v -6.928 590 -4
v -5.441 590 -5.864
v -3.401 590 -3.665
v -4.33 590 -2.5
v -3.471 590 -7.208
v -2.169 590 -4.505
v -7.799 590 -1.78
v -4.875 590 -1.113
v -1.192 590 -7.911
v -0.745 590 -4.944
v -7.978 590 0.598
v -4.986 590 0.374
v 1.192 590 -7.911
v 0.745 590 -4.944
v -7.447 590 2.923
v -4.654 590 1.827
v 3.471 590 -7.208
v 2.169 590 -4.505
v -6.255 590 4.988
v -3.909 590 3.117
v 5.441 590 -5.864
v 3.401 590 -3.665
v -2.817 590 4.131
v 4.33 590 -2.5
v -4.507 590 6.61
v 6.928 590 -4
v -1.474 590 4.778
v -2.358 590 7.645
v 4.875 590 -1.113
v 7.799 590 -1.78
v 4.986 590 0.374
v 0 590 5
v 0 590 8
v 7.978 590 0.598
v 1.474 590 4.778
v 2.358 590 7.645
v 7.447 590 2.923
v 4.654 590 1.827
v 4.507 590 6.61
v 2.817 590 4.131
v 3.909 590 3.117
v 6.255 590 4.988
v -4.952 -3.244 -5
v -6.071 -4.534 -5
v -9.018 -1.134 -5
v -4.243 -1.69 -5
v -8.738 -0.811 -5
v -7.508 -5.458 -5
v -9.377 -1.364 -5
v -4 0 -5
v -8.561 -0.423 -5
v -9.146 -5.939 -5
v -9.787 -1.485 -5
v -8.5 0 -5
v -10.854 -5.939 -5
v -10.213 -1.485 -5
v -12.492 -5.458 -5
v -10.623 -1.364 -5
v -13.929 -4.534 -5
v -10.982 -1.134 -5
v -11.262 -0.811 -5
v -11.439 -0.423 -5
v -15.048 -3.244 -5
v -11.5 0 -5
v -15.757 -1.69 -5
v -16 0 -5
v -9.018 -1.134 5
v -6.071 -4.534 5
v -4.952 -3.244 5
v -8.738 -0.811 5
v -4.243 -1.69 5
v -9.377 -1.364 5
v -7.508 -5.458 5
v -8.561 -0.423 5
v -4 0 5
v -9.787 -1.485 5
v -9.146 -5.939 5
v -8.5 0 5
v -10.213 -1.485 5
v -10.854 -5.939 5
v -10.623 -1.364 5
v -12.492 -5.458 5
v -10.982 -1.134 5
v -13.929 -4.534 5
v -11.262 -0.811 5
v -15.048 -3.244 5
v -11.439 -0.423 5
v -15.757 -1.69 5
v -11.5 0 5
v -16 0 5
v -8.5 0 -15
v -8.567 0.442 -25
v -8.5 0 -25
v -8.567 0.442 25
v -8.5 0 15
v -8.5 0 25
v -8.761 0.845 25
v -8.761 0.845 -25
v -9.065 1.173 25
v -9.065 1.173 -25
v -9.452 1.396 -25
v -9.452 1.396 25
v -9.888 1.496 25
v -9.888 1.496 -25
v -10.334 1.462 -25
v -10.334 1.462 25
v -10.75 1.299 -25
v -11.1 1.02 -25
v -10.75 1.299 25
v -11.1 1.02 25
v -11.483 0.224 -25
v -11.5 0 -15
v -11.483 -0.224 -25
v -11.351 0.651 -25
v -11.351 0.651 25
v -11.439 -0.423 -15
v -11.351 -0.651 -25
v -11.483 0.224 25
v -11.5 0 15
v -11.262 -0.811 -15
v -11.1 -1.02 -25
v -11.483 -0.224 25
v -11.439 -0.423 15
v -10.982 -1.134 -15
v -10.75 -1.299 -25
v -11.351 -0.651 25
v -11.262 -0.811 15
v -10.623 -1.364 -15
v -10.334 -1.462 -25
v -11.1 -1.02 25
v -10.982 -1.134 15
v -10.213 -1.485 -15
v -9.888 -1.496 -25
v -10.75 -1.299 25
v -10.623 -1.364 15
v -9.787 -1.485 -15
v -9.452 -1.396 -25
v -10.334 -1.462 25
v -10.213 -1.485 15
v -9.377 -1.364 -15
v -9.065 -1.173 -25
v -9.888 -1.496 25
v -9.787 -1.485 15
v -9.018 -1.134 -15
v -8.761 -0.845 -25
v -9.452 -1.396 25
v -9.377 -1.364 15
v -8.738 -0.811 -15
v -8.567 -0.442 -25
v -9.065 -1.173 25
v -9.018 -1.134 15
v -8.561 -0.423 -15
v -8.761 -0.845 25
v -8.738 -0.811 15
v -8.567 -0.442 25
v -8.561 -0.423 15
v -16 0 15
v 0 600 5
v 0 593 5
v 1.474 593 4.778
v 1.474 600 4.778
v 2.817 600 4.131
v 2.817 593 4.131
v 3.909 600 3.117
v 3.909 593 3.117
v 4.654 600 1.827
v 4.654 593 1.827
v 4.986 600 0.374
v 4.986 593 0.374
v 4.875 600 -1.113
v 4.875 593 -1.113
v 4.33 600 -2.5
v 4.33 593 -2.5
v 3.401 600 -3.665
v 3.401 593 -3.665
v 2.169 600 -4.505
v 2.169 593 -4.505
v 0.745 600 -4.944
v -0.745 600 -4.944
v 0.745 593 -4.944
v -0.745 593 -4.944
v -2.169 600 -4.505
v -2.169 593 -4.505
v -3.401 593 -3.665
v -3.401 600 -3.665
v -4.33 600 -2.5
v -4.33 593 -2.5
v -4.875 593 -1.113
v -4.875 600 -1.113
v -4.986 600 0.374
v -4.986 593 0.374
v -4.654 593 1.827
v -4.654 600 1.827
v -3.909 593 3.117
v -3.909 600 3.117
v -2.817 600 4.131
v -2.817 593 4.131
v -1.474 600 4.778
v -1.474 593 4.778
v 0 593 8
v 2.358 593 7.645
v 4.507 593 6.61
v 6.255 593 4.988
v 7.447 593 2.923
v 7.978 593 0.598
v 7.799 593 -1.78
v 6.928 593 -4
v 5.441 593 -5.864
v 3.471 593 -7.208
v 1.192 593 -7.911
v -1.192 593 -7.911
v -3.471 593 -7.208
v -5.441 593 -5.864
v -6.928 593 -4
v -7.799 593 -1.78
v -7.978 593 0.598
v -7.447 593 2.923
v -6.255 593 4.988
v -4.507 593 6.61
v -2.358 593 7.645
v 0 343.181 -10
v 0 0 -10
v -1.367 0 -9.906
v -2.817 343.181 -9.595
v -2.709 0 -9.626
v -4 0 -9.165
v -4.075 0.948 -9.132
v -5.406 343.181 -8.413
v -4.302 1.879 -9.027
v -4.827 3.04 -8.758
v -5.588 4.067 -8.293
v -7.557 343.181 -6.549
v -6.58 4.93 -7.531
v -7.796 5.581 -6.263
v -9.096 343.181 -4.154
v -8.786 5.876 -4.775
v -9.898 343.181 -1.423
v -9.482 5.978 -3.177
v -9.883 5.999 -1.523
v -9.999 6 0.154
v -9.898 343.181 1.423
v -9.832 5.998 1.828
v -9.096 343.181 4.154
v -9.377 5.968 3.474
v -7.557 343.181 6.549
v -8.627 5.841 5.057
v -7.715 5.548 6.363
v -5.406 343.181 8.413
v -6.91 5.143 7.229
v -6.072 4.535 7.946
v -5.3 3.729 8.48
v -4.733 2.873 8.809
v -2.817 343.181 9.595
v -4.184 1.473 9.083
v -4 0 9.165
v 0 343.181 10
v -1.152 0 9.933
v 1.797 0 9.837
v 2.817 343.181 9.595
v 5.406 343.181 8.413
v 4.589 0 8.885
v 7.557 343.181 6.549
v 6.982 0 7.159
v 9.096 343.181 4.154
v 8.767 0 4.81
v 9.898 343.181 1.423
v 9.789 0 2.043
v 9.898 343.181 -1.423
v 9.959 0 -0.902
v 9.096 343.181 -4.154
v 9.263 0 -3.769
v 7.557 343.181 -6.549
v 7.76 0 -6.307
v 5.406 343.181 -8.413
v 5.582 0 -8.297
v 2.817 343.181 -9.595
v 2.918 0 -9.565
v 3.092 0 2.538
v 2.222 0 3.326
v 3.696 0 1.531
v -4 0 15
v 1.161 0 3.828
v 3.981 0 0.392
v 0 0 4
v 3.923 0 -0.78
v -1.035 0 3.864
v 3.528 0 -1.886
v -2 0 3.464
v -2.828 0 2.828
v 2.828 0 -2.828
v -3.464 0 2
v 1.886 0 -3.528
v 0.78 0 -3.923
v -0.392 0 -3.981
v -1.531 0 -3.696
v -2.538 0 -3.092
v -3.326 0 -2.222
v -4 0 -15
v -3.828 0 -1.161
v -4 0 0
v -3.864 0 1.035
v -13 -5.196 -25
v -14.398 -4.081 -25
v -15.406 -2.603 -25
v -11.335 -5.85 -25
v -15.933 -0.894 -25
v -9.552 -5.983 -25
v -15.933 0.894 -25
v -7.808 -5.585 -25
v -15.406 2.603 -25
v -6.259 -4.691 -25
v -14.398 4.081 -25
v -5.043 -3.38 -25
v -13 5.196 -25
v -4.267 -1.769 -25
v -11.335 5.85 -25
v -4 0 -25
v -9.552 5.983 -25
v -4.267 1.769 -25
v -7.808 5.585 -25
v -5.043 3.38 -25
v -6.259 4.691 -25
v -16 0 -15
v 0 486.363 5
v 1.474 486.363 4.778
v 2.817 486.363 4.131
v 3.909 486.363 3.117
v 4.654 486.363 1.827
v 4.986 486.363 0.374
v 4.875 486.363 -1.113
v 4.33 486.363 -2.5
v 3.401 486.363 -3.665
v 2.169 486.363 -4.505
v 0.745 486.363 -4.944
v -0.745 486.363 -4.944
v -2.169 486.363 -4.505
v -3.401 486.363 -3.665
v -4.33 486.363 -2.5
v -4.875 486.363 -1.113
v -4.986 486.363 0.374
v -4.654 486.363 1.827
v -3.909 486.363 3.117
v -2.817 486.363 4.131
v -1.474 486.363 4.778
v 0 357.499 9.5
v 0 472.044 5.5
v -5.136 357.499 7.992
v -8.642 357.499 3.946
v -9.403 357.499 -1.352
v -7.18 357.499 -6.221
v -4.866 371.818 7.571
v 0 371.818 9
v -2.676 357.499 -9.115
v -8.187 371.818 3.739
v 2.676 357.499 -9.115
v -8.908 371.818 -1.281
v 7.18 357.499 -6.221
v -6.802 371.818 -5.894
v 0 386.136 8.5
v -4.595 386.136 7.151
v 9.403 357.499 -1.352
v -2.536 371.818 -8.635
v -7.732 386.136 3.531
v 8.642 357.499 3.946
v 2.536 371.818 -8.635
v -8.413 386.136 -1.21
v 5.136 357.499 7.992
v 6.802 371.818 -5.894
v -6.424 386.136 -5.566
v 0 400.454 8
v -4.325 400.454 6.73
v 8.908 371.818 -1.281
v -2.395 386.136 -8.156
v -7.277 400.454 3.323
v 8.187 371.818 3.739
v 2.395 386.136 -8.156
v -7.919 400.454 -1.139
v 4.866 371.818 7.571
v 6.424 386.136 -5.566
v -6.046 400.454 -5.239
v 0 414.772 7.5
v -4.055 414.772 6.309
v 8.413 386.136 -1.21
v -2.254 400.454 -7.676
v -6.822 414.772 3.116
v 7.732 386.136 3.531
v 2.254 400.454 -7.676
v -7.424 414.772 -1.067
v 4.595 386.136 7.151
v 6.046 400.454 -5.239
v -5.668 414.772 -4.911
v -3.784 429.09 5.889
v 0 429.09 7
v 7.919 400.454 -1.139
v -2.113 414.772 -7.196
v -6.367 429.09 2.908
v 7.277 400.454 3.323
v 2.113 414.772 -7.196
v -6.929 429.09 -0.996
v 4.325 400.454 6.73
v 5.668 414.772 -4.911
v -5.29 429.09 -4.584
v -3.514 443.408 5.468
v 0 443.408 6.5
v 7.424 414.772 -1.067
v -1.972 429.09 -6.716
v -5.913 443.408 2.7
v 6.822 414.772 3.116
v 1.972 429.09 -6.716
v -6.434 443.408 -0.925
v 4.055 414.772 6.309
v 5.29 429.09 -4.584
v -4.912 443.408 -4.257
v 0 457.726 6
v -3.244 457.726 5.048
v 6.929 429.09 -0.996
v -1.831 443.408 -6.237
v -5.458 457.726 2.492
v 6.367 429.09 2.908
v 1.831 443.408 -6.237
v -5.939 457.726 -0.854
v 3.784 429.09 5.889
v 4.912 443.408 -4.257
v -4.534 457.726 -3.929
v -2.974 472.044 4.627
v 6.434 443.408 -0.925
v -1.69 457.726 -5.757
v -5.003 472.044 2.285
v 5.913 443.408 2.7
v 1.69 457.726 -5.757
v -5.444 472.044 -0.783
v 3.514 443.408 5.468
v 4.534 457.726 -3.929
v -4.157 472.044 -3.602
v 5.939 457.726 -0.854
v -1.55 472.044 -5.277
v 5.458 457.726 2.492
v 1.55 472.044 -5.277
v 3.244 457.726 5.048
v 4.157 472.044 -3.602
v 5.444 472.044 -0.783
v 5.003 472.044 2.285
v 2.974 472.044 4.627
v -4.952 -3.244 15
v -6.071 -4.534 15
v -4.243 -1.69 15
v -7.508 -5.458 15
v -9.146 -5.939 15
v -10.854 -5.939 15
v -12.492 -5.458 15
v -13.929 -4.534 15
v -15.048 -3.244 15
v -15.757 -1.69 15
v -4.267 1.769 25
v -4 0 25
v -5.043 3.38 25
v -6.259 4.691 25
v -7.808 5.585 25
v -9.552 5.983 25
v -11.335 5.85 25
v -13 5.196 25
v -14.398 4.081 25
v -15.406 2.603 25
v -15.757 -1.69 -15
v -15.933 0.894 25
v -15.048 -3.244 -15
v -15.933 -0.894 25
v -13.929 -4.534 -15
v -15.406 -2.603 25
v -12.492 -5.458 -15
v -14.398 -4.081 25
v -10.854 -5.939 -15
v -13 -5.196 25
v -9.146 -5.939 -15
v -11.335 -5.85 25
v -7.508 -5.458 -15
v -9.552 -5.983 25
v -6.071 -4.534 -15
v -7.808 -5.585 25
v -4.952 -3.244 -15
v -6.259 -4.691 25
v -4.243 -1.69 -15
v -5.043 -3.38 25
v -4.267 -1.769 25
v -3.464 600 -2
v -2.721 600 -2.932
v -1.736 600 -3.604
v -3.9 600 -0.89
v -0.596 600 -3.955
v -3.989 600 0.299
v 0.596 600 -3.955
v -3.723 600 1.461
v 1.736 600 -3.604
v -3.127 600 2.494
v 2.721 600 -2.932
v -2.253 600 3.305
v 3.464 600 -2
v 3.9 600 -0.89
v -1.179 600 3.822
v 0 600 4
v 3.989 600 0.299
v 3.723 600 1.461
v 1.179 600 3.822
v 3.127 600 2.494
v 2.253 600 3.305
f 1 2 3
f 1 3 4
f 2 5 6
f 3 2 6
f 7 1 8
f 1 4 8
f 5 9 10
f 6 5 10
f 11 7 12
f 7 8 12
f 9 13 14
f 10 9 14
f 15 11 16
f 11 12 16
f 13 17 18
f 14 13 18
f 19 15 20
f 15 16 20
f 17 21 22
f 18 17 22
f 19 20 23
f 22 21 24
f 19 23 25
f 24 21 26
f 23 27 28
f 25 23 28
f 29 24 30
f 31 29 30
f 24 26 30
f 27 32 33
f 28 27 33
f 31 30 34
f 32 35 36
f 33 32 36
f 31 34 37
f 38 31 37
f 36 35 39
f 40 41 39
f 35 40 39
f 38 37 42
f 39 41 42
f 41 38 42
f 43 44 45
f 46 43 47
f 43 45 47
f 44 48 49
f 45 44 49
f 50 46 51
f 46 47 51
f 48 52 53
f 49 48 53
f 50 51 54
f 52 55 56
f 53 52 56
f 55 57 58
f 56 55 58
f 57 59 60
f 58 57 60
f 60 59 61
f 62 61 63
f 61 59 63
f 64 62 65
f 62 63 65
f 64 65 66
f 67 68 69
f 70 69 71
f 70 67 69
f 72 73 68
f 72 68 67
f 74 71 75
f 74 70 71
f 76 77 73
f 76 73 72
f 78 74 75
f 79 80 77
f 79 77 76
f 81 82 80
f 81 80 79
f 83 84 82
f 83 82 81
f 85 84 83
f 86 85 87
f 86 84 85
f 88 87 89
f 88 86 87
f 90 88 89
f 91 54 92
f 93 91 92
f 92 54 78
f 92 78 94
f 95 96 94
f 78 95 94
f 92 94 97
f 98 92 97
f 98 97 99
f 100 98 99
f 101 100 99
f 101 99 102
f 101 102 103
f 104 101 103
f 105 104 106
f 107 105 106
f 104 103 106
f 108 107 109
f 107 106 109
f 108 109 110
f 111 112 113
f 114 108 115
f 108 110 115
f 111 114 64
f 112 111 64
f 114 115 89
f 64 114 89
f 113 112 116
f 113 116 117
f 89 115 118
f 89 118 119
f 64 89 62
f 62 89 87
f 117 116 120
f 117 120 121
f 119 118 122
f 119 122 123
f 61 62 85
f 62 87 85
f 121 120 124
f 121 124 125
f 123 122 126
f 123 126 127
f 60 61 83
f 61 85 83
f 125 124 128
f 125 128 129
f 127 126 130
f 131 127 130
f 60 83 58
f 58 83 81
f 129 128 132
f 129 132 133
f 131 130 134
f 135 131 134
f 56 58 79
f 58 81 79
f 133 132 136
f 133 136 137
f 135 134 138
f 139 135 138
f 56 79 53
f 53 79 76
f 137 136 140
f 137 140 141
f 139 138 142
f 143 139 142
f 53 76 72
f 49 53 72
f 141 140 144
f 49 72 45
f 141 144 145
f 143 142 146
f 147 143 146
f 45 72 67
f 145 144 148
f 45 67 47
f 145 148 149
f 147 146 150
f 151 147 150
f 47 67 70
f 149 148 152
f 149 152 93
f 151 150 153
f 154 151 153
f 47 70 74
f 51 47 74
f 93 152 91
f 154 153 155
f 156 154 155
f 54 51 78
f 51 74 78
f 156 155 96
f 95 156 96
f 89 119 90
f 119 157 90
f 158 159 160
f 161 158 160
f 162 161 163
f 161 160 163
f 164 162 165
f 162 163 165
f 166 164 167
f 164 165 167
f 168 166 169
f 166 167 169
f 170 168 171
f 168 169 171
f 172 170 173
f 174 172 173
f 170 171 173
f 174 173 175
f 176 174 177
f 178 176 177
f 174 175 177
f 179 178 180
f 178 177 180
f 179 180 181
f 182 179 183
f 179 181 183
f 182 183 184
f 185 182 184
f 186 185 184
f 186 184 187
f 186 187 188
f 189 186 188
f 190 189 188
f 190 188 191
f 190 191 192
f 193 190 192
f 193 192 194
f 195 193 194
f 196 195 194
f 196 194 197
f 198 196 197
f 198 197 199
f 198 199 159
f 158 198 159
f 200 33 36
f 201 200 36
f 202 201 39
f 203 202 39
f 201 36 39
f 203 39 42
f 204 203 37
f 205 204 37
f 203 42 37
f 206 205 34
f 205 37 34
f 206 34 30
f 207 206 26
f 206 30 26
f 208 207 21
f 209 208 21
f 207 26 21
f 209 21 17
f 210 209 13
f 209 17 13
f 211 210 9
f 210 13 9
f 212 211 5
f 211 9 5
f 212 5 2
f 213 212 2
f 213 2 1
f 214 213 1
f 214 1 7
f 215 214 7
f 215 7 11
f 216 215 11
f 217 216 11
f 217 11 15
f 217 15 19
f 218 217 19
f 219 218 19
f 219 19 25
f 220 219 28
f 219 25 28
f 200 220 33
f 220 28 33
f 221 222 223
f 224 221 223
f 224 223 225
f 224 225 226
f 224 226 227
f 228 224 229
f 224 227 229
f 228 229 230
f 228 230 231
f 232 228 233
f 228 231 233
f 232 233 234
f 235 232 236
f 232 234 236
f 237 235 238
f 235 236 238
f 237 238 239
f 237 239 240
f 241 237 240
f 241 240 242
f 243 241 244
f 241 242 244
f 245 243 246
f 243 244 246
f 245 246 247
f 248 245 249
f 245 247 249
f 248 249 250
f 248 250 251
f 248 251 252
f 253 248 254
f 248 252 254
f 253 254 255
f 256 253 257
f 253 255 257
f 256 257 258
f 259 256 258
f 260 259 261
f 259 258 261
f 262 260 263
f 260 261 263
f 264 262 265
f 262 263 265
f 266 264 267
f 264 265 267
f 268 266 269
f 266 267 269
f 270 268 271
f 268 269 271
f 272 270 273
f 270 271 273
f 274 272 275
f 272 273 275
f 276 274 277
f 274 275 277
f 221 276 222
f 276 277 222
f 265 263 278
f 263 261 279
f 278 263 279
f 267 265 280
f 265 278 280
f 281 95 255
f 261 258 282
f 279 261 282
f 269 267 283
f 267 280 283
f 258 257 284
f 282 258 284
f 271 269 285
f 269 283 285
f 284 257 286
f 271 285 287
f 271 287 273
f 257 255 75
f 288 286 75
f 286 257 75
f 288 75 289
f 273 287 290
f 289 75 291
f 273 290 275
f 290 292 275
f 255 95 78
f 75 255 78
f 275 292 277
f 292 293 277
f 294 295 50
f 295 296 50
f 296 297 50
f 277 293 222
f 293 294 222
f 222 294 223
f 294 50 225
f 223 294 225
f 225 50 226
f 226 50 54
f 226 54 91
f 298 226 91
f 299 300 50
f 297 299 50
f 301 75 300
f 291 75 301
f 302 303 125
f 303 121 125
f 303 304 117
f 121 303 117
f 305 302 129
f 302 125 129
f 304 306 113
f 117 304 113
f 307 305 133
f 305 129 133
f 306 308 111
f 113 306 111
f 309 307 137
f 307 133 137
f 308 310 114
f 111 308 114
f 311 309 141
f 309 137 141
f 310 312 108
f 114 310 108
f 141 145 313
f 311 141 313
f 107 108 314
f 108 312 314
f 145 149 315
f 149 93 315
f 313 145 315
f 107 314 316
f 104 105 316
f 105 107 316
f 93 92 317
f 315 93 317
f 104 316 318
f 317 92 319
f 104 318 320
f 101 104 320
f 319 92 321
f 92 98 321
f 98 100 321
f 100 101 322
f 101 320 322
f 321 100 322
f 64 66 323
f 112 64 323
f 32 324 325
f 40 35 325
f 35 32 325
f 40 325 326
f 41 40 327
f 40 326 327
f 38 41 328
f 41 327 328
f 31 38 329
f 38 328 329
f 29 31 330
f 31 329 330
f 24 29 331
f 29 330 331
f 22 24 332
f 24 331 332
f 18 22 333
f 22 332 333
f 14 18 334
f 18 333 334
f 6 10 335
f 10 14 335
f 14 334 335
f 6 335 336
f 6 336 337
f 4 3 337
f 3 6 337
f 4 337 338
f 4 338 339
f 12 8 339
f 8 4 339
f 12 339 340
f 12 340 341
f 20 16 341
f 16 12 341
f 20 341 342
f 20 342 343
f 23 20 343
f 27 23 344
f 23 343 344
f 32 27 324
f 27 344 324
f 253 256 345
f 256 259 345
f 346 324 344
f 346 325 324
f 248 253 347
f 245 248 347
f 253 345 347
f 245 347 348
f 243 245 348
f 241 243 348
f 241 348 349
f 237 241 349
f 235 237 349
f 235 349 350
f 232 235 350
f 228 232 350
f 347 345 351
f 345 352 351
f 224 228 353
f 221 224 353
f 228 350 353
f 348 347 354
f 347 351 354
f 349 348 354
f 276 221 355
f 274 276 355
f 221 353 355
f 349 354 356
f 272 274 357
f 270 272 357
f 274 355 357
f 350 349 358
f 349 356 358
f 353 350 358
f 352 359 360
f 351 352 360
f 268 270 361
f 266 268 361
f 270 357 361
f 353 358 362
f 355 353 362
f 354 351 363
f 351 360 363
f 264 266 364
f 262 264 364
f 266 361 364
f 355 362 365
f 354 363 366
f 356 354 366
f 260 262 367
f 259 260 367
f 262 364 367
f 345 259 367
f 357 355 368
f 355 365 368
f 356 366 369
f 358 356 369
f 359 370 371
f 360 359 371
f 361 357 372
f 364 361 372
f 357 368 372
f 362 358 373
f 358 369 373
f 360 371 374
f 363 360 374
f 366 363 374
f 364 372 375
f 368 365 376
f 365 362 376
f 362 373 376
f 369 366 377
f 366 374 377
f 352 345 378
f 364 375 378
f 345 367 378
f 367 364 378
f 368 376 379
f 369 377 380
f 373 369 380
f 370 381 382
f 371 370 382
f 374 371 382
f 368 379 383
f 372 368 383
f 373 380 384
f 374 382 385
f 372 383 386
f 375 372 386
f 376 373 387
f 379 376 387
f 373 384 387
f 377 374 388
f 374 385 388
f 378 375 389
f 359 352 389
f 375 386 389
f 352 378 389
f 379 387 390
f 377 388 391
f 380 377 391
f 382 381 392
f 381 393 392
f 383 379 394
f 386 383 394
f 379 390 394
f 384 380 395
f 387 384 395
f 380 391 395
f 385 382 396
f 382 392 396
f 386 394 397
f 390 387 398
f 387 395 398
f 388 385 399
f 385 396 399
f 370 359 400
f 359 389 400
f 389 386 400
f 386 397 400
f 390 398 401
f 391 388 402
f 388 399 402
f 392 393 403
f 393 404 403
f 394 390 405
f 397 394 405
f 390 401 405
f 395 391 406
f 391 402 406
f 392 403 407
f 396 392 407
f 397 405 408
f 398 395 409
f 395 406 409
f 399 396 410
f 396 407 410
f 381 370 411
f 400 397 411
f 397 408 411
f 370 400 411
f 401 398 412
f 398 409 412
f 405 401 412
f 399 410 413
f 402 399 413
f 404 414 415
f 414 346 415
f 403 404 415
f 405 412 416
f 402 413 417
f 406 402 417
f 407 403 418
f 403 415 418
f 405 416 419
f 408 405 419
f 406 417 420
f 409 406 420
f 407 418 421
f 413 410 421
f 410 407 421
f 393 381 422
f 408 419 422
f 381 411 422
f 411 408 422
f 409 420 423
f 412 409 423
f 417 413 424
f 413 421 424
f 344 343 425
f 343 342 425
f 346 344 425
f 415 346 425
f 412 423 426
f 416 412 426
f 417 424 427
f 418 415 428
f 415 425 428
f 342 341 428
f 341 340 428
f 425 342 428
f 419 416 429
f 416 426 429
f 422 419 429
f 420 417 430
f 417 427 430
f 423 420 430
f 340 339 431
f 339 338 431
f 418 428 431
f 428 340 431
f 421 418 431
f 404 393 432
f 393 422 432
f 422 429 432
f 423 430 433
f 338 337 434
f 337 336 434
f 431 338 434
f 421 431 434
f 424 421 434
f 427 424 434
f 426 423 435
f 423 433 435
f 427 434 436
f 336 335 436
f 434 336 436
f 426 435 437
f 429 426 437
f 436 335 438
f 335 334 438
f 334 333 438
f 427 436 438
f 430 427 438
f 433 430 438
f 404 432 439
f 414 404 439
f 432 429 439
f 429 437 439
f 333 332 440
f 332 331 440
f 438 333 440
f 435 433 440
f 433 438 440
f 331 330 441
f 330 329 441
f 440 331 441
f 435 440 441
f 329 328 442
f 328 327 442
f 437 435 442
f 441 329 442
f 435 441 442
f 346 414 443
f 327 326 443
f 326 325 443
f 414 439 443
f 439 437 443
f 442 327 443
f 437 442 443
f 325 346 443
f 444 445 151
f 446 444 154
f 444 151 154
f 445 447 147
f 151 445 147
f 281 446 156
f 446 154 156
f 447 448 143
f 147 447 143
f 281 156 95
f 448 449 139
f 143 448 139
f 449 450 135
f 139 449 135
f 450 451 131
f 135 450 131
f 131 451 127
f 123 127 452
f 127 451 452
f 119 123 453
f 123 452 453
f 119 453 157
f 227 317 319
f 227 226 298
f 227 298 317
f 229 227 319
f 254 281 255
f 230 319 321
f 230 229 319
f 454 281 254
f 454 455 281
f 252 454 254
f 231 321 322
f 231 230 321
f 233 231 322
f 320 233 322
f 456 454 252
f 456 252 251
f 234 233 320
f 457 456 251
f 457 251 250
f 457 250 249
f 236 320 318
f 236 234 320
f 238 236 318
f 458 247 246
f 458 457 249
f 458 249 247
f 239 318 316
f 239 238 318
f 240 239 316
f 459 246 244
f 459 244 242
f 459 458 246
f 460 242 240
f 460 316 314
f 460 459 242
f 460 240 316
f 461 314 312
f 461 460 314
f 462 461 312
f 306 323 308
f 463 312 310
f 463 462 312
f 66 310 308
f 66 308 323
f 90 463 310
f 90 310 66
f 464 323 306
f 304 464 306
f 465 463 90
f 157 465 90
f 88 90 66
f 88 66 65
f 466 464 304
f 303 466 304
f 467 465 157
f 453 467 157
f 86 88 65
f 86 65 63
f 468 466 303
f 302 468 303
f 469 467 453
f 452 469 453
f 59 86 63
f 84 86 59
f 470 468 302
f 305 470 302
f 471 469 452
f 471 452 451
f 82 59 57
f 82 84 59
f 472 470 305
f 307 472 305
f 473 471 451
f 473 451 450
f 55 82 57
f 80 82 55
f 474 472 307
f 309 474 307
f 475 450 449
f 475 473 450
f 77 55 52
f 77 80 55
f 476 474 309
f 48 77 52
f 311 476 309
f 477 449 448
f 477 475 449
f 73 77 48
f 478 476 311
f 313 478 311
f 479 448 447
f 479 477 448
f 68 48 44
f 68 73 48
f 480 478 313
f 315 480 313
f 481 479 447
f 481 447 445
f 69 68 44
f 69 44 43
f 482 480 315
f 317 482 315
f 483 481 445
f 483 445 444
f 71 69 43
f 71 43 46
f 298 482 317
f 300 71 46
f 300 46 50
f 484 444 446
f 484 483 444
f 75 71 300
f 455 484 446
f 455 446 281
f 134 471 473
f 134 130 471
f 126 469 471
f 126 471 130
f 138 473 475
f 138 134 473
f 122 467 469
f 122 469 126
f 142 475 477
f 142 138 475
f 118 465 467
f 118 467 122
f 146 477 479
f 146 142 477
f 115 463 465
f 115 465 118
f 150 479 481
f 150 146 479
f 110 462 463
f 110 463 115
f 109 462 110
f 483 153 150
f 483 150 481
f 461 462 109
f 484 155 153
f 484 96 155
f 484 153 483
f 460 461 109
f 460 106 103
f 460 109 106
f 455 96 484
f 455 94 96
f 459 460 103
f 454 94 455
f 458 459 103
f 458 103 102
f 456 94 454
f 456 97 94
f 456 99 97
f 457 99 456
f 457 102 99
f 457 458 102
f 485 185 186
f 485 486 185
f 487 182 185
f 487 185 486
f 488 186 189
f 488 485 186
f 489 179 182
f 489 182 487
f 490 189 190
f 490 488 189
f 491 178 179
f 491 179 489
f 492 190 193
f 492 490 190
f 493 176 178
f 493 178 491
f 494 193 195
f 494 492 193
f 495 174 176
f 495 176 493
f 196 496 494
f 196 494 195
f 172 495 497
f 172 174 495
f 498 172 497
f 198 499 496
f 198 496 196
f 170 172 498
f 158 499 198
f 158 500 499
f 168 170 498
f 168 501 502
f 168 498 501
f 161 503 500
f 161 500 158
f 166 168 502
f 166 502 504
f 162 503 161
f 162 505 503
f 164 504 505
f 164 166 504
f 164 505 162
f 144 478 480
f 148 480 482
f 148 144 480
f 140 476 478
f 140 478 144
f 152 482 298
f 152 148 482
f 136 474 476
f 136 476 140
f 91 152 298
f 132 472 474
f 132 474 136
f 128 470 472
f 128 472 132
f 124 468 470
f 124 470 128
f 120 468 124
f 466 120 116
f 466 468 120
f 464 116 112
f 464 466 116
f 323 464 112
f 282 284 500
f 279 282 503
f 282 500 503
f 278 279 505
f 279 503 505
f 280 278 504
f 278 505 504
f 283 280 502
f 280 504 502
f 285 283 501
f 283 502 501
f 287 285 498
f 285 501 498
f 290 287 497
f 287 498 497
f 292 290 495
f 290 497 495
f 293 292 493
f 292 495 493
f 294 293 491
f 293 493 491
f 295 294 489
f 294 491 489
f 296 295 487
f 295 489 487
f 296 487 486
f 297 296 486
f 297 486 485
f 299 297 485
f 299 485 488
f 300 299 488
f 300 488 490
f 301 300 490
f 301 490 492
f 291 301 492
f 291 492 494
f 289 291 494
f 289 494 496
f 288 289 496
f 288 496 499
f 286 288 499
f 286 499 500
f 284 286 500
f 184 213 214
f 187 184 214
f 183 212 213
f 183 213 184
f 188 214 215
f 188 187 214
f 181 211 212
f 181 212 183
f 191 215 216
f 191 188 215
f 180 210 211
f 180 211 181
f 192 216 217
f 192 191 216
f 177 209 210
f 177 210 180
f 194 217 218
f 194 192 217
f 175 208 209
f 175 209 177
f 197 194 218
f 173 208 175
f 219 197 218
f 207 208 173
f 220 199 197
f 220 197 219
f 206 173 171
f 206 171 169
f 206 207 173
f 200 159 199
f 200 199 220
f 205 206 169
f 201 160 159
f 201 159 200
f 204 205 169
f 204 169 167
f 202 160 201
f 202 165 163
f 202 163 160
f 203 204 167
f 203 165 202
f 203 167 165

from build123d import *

# Parameters (mm, degrees)
ESQUISSE1_R                  = 5
BOSS_EXTRU_1_DEPTH           = 600
ESQUISSE2_R                  = 10
BOSS_EXTRU_2_DEPTH           = 200
CHANFREIN1_SIZE              = 10
CHANFREIN1_SIZE_2            = 286.362532829
ESQUISSE3_R                  = 4
ENL_V_MAT_EXTRU_1_DEPTH      = 601.166643525
ESQUISSE4_R                  = 8
ESQUISSE4_R_2                = 4.5
BOSS_EXTRU_3_DEPTH           = 3
ESQUISSE5_R                  = 6
BOSS_EXTRU_4_DEPTH           = 25
ENL_V_MAT_EXTRU_2_DEPTH      = 601.733718055
ENL_V_MAT_EXTRU_2_DEPTH_BACK = 601.733718055
ESQUISSE6_W                  = 10
ESQUISSE6_H                  = 13.340291415
ESQUISSE7_R                  = 1.5
ENL_V_MAT_EXTRU_3_DEPTH      = 603.292287858


with BuildPart() as part:
    # Esquisse1 → Boss.-Extru.1 (new body)
    with BuildSketch(Plane(origin=(0, 0, 0), x_dir=(1, 0, 0), z_dir=(0, 1, 0))):
        with Locations(Location((0, 0, 0), (0, 0, 270))):
            Circle(ESQUISSE1_R)
    extrude(amount=BOSS_EXTRU_1_DEPTH)

    # Esquisse2 → Boss.-Extru.2 (add)
    with BuildSketch(Plane(origin=(0, 0, 0), x_dir=(1, 0, 0), z_dir=(0, 1, 0))):
        with Locations(Location((0, 0, 0), (0, 0, 90))):
            Circle(ESQUISSE2_R)
    extrude(amount=BOSS_EXTRU_2_DEPTH)

    # Chanfrein1
    # the kernel refuses this chamfer: 286.362532829, 10 mm, written as the material it adds along each edge
    with BuildSketch(Plane(origin=(0, 200, 0), x_dir=(0, 0, 1), z_dir=(1, 0, 0))) as chanfrein1_piece_1_section:
        Polygon((5 + CHANFREIN1_SIZE, 0), (5, -CHANFREIN1_SIZE_2), (5, 0), align=None)
    chanfrein1_piece_1 = revolve(axis=Axis((0, 200, 0), (0, -1, 0)), mode=Mode.PRIVATE)
    chanfrein1_piece_1 = chanfrein1_piece_1 & Plane(origin=(0, 318.034394442, 0), x_dir=(0, 0, -1), z_dir=(0, -1, 0)) * Cylinder(10, 1146, mode=Mode.PRIVATE)
    add(chanfrein1_piece_1)

    # Esquisse3 → Enlèv. mat.-Extru.1 (cut, through all)
    with BuildSketch(Plane(origin=(0, 600, 0), x_dir=(1, 0, 0), z_dir=(0, 1, 0))):
        with Locations(Location((0, 0, 0), (0, 0, 270))):
            Circle(ESQUISSE3_R)
    extrude(amount=-ENL_V_MAT_EXTRU_1_DEPTH, mode=Mode.SUBTRACT)

    # Esquisse4 → Boss.-Extru.3 (add)
    with BuildSketch(Plane(origin=(0, 590, 0), x_dir=(1, 0, 0), z_dir=(0, 1, 0))):
        with Locations(Location((0, 0, 0), (0, 0, 270))):
            Circle(ESQUISSE4_R)
        Circle(ESQUISSE4_R_2, mode=Mode.SUBTRACT)
    extrude(amount=BOSS_EXTRU_3_DEPTH)

    # Esquisse5 → Boss.-Extru.4 (add, symmetric)
    with BuildSketch(Plane.XY):
        with Locations((-10, 0)):
            Circle(ESQUISSE5_R)
    extrude(amount=BOSS_EXTRU_4_DEPTH, both=True)

    # Esquisse6 → Enlèv. mat.-Extru.2 (cut, two sides: drawn at the far end of the back side and taken through both)
    with BuildSketch(Plane(origin=(0, 0, 0), x_dir=(0, 0, -1), z_dir=(1, 0, 0)).offset(-ENL_V_MAT_EXTRU_2_DEPTH_BACK)):
        with Locations((-10, -6.670145708)):
            Rectangle(ESQUISSE6_W, ESQUISSE6_H)
        with Locations((10, -6.670145708)):
            Rectangle(ESQUISSE6_W, ESQUISSE6_H)
    extrude(amount=ENL_V_MAT_EXTRU_2_DEPTH + ENL_V_MAT_EXTRU_2_DEPTH_BACK, mode=Mode.SUBTRACT)

    # Esquisse7 → Enlèv. mat.-Extru.3 (cut, through all)
    with BuildSketch(Plane.XY.offset(25)):
        with Locations((-10, 0)):
            Circle(ESQUISSE7_R)
    extrude(amount=-ENL_V_MAT_EXTRU_3_DEPTH, mode=Mode.SUBTRACT)


solid = part.part
